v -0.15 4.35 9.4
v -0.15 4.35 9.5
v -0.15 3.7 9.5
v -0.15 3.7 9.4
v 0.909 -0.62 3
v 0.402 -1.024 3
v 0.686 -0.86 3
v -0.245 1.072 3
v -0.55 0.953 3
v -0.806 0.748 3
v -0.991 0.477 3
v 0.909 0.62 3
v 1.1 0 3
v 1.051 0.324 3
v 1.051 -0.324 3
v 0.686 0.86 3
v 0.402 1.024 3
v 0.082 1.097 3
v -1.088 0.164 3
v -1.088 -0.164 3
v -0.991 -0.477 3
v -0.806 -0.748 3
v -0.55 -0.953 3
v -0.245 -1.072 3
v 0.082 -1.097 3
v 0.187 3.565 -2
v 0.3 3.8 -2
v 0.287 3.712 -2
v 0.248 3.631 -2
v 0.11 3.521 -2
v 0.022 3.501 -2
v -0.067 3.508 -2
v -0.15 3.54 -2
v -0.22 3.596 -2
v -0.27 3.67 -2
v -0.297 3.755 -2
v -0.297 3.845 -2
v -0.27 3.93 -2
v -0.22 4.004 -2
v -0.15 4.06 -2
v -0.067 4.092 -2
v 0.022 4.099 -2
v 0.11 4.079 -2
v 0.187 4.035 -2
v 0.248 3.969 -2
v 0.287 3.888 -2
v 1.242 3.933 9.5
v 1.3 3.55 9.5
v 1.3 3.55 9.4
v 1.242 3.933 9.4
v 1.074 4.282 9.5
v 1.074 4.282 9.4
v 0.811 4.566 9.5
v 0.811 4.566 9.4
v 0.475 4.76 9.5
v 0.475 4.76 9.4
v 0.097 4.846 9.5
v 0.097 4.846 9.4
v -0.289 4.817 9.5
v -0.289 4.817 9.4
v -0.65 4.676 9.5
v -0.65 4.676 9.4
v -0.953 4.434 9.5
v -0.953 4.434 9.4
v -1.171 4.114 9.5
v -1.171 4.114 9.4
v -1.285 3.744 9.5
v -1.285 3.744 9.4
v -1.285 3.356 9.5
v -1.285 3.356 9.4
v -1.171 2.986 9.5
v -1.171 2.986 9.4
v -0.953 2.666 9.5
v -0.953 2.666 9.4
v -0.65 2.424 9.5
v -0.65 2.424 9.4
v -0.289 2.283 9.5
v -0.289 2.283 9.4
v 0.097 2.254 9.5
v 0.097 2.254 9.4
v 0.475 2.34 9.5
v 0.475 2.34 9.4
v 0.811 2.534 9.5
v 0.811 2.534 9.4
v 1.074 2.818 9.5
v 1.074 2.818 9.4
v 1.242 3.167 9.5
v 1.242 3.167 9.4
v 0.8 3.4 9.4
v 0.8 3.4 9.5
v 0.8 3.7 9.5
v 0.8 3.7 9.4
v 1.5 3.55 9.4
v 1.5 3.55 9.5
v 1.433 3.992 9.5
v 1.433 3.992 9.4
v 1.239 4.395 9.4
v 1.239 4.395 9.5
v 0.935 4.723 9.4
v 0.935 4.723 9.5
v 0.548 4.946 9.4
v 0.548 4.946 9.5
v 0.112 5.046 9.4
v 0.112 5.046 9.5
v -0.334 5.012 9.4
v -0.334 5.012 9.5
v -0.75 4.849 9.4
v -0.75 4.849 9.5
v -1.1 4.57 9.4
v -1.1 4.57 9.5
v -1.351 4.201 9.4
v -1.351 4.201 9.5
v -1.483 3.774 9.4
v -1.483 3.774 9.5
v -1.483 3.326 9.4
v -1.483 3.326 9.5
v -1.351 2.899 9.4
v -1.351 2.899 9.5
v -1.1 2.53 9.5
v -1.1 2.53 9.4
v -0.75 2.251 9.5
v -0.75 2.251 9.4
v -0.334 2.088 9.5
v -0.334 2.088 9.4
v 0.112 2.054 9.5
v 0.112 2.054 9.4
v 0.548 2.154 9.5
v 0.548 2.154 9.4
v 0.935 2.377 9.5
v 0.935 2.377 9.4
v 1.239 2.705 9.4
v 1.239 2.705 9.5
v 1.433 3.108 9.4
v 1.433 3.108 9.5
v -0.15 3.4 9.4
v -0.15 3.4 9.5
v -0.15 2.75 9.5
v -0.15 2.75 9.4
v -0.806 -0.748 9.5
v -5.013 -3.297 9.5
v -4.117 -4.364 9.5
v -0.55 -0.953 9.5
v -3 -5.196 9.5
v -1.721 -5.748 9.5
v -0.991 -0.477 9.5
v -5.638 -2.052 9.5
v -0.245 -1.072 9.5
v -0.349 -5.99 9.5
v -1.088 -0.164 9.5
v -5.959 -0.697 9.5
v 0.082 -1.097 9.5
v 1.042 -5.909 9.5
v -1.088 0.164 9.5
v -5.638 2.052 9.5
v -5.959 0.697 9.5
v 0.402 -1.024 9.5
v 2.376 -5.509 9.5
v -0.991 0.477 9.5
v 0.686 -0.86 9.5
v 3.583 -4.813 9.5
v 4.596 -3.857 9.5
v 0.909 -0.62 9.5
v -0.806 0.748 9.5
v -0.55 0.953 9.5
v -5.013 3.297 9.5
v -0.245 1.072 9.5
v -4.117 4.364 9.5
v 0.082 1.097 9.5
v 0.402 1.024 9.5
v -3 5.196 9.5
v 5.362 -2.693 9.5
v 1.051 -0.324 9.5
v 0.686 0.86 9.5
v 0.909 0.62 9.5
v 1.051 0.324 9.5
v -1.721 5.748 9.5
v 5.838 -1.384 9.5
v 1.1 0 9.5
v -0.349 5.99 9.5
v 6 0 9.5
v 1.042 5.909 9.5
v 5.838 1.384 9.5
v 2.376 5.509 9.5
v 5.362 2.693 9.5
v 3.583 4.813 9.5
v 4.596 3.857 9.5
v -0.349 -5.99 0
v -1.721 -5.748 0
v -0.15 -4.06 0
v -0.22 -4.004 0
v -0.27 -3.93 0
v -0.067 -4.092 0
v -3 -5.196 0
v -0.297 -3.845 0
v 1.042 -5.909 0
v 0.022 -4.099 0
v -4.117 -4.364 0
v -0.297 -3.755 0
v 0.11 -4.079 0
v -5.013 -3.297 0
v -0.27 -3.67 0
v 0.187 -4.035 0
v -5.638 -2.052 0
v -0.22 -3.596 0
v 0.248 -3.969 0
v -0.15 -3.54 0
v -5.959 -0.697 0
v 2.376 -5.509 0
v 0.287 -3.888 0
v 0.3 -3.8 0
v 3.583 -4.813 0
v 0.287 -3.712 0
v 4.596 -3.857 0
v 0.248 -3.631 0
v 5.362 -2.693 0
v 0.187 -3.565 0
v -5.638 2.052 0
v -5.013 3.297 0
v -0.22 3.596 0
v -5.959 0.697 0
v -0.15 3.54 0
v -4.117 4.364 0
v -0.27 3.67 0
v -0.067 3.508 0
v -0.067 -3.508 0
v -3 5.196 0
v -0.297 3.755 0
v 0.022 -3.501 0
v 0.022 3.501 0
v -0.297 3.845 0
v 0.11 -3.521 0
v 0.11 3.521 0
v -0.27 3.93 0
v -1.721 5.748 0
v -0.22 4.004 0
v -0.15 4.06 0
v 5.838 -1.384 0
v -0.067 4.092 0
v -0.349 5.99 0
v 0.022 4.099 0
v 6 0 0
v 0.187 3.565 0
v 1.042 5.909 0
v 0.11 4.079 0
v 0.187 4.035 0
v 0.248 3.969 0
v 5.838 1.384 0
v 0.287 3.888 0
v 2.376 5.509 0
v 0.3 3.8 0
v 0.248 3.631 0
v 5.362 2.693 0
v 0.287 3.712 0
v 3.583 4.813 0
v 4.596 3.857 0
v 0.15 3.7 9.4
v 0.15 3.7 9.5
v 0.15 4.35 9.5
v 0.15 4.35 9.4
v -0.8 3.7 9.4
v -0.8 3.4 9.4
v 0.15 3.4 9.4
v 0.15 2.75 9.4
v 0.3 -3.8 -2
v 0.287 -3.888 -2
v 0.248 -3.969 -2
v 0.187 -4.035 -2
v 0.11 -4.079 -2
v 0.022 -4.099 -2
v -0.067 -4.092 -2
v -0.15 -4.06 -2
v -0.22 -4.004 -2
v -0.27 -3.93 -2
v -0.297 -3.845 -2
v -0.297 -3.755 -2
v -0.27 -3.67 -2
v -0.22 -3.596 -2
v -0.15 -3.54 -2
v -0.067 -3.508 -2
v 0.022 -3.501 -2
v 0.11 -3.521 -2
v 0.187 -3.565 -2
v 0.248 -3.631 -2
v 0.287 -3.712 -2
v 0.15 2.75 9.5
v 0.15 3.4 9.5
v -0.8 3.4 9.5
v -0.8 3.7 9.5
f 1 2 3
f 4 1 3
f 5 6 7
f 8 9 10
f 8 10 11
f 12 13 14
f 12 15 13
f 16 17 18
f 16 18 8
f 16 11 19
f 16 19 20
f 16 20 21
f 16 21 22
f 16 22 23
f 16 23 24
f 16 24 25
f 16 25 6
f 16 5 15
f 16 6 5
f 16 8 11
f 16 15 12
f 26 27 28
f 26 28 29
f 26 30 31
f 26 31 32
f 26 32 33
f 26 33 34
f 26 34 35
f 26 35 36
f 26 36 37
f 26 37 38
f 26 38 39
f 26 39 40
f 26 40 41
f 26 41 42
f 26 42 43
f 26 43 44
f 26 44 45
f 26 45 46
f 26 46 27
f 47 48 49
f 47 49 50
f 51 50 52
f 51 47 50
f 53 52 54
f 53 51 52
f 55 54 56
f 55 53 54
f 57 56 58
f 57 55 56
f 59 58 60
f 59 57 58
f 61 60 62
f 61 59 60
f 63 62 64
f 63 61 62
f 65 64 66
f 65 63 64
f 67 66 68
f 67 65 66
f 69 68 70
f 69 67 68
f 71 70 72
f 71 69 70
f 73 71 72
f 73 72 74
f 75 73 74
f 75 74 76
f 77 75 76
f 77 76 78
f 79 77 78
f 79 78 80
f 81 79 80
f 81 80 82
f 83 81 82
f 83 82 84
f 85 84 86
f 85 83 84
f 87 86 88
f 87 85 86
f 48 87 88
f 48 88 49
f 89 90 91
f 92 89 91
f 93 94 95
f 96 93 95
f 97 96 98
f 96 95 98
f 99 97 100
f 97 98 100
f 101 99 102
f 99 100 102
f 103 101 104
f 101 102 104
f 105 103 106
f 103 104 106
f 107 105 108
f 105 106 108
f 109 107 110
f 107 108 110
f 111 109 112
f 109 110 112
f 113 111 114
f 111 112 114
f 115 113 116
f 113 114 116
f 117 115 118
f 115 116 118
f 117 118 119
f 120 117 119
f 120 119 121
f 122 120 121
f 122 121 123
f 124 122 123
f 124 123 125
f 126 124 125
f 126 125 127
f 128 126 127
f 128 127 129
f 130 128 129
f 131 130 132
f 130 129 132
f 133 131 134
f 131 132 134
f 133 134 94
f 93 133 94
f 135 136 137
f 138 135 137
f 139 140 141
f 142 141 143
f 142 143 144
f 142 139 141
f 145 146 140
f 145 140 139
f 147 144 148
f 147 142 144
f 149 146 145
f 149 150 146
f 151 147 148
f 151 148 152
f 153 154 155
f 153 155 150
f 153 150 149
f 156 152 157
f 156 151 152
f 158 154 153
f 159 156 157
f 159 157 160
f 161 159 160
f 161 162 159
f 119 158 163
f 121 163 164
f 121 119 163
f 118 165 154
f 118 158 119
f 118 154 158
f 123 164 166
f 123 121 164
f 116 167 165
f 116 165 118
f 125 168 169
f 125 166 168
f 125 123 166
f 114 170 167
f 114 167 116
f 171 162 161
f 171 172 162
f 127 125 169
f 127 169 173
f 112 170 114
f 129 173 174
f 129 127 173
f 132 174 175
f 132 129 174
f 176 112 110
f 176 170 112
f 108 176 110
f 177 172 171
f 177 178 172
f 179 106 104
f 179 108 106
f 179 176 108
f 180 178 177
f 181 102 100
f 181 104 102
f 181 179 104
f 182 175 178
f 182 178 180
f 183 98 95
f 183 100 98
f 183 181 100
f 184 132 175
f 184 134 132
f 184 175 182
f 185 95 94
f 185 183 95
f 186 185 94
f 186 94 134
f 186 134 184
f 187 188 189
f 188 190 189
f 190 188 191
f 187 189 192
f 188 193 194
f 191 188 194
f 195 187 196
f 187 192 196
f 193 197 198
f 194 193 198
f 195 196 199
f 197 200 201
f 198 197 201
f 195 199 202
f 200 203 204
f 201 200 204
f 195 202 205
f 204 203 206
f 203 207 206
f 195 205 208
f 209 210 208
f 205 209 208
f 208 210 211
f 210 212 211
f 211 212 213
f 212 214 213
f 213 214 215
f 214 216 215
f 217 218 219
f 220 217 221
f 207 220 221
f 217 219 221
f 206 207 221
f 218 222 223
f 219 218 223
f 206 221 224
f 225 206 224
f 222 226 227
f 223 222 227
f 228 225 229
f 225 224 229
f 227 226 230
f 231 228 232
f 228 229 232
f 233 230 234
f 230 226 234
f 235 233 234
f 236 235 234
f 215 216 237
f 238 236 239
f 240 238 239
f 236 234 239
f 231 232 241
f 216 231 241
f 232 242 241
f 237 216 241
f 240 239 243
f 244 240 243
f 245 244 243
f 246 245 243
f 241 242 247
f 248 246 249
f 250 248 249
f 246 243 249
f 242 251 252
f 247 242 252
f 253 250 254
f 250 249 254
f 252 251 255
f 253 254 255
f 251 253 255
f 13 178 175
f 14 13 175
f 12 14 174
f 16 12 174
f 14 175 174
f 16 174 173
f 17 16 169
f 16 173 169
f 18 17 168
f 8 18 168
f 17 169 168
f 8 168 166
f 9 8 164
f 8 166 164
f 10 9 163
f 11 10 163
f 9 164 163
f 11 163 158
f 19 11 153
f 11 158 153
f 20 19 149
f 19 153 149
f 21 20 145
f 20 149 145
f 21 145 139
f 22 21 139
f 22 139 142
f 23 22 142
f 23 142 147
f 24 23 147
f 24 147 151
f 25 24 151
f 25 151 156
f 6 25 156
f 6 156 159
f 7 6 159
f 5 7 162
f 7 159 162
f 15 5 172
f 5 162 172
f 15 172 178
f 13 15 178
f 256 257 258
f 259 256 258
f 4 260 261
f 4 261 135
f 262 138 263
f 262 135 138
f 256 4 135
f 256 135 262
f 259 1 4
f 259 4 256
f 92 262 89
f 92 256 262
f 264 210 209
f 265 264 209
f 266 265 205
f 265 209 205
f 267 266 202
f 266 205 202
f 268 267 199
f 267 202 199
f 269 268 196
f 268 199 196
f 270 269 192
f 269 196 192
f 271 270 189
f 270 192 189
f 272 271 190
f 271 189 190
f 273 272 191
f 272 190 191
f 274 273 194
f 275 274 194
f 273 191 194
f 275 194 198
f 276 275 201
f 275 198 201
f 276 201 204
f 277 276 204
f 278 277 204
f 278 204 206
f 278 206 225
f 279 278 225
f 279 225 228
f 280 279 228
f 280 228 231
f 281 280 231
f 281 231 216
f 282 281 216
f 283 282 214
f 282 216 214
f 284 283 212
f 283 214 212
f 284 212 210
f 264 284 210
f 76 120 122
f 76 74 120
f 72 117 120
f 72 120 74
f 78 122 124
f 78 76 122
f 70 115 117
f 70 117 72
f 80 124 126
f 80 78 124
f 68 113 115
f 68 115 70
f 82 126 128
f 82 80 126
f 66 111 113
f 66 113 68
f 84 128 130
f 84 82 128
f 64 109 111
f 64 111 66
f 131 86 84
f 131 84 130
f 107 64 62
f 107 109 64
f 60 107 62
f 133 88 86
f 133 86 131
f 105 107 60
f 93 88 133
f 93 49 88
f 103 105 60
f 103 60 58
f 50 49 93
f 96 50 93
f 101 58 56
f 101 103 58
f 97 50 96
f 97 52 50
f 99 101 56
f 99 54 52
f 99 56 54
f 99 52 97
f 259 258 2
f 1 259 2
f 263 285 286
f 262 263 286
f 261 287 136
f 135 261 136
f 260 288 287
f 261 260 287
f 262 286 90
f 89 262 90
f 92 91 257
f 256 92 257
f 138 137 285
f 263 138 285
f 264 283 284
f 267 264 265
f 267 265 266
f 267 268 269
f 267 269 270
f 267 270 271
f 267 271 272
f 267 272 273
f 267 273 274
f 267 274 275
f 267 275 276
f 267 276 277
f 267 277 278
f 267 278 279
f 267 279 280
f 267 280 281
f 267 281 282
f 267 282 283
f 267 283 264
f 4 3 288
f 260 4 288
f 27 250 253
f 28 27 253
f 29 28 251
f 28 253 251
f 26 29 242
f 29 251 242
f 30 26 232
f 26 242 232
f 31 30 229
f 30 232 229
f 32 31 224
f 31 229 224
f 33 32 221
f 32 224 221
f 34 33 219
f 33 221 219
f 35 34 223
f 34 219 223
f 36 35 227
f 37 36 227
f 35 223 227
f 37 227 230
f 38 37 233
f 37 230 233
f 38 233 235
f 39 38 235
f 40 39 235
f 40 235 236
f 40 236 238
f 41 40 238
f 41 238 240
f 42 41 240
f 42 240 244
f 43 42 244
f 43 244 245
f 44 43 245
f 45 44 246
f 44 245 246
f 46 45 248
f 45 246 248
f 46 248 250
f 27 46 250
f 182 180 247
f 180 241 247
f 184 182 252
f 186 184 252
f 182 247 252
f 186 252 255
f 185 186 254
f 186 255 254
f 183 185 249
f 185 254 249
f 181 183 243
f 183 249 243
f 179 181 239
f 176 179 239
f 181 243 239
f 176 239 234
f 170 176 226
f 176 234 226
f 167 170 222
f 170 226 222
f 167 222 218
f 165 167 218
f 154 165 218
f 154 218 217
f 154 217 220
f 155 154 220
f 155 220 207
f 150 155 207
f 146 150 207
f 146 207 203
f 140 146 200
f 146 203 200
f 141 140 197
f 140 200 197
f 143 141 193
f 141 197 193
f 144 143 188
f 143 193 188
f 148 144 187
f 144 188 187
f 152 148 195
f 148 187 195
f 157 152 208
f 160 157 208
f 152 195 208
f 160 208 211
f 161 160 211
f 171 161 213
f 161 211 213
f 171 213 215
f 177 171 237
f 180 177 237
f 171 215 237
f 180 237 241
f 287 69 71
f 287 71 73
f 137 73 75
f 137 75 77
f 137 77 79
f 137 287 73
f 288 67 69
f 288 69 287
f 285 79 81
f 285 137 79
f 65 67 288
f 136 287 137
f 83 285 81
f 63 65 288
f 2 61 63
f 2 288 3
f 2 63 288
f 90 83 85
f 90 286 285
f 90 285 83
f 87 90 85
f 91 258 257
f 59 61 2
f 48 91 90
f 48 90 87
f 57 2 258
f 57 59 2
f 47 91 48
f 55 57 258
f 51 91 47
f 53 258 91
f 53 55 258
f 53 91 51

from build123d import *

# Parameters (mm, degrees)
SKETCH1_R           = 6
BOSS_EXTRUDE2_DEPTH = 3
SKETCH4_R           = 6
BOSS_EXTRUDE3_DEPTH = 6.5
SKETCH5_R           = 1.1
CUT_EXTRUDE2_DEPTH  = 6.5
SKETCH6_R           = 1.5
SKETCH6_R_2         = 1.3
CUT_EXTRUDE3_DEPTH  = 0.1
SKETCH7_R           = 0.3
BOSS_EXTRUDE4_DEPTH = 2


with BuildPart() as part:
    # Sketch1 → Boss-Extrude2 (new body)
    with BuildSketch(Plane.XY):
        Circle(SKETCH1_R)
    extrude(amount=BOSS_EXTRUDE2_DEPTH)

    # Sketch4 → Boss-Extrude3 (add)
    with BuildSketch(Plane.XY.offset(3)):
        Circle(SKETCH4_R)
    extrude(amount=BOSS_EXTRUDE3_DEPTH)

    # Sketch5 → Cut-Extrude2 (cut)
    with BuildSketch(Plane.XY.offset(9.5)):
        Circle(SKETCH5_R)
    extrude(amount=-CUT_EXTRUDE2_DEPTH, mode=Mode.SUBTRACT)

    # Sketch6 → Cut-Extrude3 (cut)
    # profile 1 of 2: a face of its own
    with BuildSketch(Plane.XY.offset(9.5)):
        with Locations((0, 3.55)):
            Circle(SKETCH6_R)
        with Locations((0, 3.55)):
            Circle(SKETCH6_R_2, mode=Mode.SUBTRACT)
    # profile 2 of 2: a face of its own
    with BuildSketch(Plane.XY.offset(9.5)):
        Polygon((-0.15, 2.75), (0.15, 2.75), (0.15, 3.4), (0.8, 3.4), (0.8, 3.55), (0.8, 3.7), (0.15, 3.7), (0.15, 4.35), (-0.15, 4.35), (-0.15, 3.7), (-0.8, 3.7), (-0.8, 3.4), (-0.15, 3.4), align=None)
    extrude(amount=-CUT_EXTRUDE3_DEPTH, mode=Mode.SUBTRACT)

    # Sketch7 → Boss-Extrude4 (add)
    with BuildSketch(Plane(origin=(0, 0, 0), x_dir=(-1, 0, 0), z_dir=(0, 0, -1))):
        with Locations(Location((0, 3.8, 0), (0, 0, 180))):
            Circle(SKETCH7_R)
        with Locations(Location((0, -3.8, 0), (0, 0, 180))):
            Circle(SKETCH7_R)
    extrude(amount=BOSS_EXTRUDE4_DEPTH)


solid = part.part
